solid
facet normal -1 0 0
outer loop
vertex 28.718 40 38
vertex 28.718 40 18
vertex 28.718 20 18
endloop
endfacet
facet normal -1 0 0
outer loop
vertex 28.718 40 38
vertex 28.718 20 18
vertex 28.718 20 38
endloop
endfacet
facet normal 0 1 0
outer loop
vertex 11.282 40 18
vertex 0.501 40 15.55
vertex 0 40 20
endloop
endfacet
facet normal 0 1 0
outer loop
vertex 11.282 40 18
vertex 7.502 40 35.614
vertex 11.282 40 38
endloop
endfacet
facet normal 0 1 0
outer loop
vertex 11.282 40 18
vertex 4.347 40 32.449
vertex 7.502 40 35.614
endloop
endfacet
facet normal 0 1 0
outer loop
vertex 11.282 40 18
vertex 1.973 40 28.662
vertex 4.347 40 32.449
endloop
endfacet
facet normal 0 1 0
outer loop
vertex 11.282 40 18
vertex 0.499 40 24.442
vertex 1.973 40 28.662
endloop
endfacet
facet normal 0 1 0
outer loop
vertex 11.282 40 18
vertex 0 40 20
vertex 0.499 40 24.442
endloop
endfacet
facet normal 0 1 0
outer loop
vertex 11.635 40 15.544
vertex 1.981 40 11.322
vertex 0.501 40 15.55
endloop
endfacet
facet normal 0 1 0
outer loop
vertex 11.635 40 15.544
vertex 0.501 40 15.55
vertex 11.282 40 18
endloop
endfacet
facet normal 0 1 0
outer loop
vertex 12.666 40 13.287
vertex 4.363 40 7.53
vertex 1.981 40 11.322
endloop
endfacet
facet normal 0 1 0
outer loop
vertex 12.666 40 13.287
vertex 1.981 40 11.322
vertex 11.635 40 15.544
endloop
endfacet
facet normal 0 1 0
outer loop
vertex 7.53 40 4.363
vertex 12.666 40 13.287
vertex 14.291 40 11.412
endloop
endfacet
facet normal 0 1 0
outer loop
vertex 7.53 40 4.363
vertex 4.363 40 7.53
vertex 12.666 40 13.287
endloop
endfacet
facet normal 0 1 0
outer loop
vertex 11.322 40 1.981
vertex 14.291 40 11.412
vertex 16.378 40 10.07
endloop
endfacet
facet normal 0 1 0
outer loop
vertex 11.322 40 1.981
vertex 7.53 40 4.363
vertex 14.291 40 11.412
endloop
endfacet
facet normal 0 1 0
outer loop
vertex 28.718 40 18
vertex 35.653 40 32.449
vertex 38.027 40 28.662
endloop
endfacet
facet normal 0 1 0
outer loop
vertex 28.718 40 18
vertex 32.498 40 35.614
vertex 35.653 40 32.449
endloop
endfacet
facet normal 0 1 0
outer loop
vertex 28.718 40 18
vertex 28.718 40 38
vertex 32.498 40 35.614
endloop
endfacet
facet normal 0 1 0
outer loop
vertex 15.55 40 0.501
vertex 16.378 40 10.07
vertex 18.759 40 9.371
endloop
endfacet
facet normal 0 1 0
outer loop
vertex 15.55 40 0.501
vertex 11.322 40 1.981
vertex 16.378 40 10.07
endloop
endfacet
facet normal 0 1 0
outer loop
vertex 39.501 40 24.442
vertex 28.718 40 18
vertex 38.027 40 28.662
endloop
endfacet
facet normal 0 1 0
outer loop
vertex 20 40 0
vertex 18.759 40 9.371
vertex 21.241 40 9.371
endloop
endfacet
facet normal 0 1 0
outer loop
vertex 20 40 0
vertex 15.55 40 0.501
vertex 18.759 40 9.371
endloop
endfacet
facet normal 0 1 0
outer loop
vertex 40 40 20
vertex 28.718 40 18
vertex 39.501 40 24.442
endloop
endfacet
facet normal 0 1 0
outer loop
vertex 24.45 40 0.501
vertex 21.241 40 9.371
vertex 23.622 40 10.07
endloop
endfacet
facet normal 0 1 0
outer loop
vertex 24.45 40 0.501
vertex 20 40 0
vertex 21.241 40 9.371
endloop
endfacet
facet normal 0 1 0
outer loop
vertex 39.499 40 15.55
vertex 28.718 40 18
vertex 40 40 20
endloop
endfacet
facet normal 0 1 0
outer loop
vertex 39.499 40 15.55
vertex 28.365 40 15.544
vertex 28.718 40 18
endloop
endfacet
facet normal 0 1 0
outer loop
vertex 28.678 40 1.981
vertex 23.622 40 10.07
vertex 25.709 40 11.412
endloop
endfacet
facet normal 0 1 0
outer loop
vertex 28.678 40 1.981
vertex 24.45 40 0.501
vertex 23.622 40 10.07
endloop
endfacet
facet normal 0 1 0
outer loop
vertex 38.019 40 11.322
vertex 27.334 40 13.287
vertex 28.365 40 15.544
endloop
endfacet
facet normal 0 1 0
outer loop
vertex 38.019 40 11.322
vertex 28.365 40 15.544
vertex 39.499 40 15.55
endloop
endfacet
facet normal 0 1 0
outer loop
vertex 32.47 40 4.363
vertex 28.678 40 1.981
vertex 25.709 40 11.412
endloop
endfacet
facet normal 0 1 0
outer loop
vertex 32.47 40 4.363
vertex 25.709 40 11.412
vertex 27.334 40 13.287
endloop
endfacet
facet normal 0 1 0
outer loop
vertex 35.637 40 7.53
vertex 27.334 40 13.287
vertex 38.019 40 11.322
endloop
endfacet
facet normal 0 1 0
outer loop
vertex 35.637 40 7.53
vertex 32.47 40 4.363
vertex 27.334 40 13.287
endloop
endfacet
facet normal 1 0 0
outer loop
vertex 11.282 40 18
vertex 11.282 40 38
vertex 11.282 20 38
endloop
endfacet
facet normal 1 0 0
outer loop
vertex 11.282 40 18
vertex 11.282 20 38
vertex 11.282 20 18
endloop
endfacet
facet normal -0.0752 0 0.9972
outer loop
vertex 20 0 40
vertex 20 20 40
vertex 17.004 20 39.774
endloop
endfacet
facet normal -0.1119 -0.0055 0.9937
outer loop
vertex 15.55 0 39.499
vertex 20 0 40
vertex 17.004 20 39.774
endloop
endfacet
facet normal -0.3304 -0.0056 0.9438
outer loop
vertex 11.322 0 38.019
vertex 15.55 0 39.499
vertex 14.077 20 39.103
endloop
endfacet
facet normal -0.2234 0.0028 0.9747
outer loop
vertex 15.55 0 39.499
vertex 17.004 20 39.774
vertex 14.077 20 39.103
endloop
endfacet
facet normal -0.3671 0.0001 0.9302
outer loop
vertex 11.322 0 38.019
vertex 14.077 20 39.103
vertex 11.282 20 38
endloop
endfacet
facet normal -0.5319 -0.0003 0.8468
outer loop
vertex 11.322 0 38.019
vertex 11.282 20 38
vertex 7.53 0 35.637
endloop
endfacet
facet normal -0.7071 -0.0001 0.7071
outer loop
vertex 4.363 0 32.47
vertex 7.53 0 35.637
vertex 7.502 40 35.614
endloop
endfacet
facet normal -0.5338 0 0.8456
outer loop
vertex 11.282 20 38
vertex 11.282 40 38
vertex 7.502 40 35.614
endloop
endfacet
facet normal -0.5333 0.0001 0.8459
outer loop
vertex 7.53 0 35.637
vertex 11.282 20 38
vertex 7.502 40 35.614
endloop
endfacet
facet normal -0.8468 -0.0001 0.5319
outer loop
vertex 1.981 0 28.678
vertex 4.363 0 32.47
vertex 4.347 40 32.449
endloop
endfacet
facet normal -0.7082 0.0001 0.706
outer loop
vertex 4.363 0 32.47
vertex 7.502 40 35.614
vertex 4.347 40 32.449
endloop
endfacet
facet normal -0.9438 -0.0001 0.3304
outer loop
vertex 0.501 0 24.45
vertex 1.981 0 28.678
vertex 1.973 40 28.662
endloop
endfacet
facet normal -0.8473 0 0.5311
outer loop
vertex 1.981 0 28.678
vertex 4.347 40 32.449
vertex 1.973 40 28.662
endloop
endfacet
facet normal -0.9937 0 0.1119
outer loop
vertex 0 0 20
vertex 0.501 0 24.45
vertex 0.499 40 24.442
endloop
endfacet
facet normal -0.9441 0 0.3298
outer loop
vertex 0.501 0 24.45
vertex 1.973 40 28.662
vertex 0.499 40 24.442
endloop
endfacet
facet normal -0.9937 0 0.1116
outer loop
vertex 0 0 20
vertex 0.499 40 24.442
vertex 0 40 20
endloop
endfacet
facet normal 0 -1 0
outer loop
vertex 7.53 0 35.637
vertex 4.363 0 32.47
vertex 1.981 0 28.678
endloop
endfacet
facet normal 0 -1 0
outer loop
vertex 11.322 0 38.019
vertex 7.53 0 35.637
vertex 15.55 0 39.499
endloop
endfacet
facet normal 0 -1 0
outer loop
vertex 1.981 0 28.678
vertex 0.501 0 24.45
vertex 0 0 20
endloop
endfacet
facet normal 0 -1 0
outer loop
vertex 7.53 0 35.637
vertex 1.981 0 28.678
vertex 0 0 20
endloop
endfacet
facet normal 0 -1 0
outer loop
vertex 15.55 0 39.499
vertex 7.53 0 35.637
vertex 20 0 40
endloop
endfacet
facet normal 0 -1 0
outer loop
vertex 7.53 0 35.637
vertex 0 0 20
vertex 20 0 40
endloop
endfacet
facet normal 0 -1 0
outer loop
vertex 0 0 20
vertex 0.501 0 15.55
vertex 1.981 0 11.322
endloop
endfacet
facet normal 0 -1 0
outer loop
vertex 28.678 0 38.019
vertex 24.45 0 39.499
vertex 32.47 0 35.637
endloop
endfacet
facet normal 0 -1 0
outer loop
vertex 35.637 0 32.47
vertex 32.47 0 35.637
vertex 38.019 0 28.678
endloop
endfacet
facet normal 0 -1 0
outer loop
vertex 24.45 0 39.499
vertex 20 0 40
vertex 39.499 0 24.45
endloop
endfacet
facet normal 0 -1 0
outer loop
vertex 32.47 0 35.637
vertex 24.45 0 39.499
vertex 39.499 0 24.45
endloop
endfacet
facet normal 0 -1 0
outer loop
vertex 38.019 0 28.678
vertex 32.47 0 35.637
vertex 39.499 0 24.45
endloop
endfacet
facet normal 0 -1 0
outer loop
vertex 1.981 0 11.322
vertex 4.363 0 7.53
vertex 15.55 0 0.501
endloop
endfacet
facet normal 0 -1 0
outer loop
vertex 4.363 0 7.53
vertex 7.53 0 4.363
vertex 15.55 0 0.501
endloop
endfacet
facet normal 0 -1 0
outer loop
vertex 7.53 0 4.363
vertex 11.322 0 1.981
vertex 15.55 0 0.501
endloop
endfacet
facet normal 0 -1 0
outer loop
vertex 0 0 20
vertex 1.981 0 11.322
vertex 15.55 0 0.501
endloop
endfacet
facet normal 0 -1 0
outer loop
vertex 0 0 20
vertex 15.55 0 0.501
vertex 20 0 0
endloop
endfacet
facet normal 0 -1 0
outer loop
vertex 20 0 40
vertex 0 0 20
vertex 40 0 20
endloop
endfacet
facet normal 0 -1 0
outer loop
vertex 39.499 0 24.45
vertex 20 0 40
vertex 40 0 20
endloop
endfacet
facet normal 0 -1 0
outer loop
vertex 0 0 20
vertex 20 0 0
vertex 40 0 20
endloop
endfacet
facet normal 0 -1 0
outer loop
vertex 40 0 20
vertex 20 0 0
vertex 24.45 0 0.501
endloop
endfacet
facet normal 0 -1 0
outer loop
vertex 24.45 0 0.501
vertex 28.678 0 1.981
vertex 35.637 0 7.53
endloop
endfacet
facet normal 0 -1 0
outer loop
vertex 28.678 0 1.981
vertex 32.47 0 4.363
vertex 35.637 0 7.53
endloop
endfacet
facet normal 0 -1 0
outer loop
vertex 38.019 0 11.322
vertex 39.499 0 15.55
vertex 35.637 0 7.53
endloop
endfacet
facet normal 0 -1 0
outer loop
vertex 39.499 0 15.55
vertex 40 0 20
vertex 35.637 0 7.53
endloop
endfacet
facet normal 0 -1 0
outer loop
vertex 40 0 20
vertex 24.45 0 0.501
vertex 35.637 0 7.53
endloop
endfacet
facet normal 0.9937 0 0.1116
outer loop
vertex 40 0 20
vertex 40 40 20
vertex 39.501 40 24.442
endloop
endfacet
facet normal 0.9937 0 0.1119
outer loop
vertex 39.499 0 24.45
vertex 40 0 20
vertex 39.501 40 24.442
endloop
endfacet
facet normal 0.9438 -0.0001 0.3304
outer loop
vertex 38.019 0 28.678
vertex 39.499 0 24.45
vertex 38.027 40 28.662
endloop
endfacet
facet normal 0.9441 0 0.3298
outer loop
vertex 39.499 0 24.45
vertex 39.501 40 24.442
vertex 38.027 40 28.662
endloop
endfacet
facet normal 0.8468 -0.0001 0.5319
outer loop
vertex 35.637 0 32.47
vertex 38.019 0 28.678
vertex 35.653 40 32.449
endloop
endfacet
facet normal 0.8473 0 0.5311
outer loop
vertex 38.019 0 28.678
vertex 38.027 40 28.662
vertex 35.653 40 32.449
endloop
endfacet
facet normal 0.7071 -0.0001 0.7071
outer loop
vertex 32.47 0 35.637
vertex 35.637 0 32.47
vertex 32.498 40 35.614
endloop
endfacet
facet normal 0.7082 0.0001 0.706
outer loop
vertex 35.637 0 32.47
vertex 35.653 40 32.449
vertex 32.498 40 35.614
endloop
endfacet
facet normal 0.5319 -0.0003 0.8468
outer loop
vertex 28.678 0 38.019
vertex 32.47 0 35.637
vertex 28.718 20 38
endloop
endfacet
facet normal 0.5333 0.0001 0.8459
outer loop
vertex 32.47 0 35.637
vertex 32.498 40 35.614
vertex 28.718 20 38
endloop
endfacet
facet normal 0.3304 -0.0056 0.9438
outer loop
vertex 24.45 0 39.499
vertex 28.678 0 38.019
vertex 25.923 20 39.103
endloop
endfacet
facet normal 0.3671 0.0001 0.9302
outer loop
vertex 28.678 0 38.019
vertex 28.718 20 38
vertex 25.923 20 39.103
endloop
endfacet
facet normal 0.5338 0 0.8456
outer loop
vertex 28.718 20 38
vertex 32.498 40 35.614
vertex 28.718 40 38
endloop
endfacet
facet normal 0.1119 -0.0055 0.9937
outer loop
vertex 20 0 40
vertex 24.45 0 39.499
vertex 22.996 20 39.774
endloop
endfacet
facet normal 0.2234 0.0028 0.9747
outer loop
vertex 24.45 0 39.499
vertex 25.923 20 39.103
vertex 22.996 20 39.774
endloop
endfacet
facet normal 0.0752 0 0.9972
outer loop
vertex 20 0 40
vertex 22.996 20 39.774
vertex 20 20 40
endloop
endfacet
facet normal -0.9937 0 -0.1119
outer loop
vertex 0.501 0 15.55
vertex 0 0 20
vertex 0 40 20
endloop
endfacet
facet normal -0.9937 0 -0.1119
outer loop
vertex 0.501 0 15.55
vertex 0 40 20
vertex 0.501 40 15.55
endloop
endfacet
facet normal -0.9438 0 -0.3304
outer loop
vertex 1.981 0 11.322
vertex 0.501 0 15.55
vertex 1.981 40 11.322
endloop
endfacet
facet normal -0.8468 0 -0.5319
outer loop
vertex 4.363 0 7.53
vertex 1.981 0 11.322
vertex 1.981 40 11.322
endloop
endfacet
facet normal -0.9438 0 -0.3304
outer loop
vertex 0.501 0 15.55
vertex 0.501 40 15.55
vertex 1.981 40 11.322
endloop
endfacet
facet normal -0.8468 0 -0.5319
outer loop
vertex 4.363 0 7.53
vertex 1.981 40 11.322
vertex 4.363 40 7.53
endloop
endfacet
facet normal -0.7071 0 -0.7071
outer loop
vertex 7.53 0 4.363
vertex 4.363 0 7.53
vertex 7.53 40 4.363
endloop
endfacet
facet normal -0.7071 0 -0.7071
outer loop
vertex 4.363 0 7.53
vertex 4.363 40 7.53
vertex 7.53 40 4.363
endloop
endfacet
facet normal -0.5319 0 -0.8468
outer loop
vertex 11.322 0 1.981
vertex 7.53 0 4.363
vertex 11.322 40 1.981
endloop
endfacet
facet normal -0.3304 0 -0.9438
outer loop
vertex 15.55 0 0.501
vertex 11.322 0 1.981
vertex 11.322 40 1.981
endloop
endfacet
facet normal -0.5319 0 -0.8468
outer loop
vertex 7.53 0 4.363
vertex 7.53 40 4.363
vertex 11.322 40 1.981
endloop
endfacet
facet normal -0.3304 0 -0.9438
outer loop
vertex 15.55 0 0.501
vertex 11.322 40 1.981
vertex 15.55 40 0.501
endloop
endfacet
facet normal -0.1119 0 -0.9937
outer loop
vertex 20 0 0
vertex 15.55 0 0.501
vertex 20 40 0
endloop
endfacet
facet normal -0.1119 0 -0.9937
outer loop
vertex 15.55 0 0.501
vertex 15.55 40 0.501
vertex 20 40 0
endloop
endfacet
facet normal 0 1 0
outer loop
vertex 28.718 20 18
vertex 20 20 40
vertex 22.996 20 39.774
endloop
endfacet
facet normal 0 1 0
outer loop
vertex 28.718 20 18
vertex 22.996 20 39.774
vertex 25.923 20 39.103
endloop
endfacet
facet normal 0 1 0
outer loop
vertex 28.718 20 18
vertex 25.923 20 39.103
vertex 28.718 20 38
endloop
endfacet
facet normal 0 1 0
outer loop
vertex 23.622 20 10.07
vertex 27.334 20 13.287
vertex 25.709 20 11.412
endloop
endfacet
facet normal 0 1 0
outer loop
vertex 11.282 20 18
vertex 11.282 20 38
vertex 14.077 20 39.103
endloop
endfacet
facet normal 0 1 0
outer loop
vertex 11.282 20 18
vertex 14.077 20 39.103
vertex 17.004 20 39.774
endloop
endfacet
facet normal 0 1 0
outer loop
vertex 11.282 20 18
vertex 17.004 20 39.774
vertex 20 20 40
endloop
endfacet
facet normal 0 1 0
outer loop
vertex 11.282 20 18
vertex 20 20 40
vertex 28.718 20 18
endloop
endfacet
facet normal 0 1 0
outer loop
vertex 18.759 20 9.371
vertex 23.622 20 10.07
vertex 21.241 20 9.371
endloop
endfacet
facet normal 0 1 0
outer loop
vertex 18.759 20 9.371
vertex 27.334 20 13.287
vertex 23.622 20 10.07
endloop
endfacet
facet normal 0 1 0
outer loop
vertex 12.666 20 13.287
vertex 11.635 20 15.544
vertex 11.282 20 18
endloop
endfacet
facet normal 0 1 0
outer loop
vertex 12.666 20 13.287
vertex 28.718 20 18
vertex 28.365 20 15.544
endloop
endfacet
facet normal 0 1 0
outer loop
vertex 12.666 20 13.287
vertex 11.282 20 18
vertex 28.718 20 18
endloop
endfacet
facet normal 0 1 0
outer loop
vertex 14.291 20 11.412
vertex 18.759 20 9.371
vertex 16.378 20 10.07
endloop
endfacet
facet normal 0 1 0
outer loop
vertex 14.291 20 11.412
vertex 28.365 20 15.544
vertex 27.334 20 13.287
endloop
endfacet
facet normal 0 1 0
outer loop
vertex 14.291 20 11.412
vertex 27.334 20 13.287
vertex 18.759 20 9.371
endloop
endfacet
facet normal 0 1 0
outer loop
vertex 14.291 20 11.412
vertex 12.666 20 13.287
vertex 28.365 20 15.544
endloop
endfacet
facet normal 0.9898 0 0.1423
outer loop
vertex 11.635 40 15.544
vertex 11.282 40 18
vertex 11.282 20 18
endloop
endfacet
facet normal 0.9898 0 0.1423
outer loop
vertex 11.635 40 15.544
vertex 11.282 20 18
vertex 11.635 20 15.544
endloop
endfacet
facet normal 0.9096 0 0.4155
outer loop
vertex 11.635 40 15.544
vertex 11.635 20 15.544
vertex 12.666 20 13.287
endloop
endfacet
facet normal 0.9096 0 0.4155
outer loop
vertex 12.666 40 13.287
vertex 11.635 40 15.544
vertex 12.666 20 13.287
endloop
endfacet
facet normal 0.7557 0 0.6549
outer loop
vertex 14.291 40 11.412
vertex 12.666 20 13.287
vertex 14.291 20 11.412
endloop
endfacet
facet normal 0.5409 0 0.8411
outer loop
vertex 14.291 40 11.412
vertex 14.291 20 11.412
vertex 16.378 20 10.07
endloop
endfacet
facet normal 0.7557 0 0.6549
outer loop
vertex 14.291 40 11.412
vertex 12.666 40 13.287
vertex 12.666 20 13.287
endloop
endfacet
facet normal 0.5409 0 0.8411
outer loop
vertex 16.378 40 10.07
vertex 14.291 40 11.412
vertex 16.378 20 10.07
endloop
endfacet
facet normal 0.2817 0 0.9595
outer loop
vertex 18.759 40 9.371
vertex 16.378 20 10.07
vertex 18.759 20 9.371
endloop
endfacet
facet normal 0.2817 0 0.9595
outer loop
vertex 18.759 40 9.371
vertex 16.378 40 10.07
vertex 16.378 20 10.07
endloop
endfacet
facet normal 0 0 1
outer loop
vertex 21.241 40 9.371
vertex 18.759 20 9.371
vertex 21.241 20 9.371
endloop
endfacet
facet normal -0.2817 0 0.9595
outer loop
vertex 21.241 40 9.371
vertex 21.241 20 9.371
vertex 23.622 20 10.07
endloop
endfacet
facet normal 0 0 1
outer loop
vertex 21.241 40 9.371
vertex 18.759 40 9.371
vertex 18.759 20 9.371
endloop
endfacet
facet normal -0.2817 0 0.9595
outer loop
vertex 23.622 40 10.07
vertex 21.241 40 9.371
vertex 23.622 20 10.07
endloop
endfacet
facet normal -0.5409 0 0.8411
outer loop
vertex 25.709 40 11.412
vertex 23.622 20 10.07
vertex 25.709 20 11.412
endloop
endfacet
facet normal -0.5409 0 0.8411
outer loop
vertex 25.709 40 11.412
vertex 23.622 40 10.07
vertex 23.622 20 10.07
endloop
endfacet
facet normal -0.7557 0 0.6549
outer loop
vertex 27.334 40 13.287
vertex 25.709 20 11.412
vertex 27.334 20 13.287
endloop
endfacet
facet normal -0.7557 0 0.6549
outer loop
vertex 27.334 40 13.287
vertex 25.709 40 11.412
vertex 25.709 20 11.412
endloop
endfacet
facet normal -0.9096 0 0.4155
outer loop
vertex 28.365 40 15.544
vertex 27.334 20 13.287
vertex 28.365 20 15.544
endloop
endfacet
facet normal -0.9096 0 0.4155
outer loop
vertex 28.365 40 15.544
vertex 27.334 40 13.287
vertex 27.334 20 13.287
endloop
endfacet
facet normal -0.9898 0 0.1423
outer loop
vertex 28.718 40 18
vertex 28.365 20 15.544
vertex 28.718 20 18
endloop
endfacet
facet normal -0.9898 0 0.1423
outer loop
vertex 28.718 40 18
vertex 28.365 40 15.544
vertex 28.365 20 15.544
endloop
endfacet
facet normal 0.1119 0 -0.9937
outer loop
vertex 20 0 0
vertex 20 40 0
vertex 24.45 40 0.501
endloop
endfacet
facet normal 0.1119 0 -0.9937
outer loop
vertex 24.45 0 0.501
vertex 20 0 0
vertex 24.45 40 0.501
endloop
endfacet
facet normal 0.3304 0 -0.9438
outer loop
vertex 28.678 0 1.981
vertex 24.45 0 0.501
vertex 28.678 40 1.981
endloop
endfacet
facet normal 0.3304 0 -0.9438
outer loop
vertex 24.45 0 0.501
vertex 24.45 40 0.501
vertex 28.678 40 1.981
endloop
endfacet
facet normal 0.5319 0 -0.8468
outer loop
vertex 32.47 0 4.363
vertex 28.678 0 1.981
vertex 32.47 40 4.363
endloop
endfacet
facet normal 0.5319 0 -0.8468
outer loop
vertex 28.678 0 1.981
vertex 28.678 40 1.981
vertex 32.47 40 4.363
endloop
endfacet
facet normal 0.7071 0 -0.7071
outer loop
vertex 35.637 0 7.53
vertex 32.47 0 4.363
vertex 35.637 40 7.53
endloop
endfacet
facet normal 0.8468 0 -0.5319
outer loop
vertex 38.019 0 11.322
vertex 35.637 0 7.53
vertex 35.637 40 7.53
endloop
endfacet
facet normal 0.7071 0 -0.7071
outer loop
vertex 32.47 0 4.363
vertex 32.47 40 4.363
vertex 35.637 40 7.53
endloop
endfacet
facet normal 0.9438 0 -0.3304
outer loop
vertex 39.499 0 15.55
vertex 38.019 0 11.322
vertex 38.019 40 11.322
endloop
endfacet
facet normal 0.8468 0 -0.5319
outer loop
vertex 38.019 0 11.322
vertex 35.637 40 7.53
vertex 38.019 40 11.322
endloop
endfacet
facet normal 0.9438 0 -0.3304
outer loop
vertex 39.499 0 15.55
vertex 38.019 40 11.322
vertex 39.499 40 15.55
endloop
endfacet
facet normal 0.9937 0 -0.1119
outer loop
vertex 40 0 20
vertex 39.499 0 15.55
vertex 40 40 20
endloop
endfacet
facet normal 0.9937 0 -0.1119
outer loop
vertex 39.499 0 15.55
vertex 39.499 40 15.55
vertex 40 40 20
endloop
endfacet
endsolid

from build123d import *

# Parameters (mm, degrees)
SKETCH1_W           = 40
SKETCH1_H           = 40
BOSS_EXTRUDE1_DEPTH = 40
CUT_EXTRUDE1_DEPTH  = 40
SKETCH3_W           = 2
SKETCH3_H           = 20
CUT_EXTRUDE2_DEPTH  = 40
CUT_EXTRUDE3_DEPTH  = 20


with BuildPart() as part:
    # Sketch1 → Boss-Extrude1 (new body)
    with BuildSketch(Plane.XY):
        with Locations((20, 20)):
            Rectangle(SKETCH1_W, SKETCH1_H)
    extrude(amount=BOSS_EXTRUDE1_DEPTH)

    # Sketch2 → Cut-Extrude1 (cut)
    with BuildSketch(Plane(origin=(0, 40, 0), x_dir=(1, 0, 0), z_dir=(0, 1, 0))):
        with BuildLine():
            Line((20, 0), (0, 0))
            Line((0, 0), (0, -20))
            ThreePointArc((0, -20), (5.857864376, -5.857864376), (20, 0))
        make_face()
        with BuildLine():
            Line((40, 0), (20, 0))
            ThreePointArc((20, 0), (34.142135624, -5.857864376), (40, -20))
            Line((40, -20), (40, 0))
        make_face()
        with BuildLine():
            Line((40, -40), (40, -20))
            ThreePointArc((40, -20), (34.142135624, -34.142135624), (20, -40))
            Line((20, -40), (40, -40))
        make_face()
        with BuildLine():
            ThreePointArc((20, -40), (5.857864376, -34.142135624), (0, -20))
            Line((0, -20), (0, -40))
            Line((0, -40), (20, -40))
        make_face()
    extrude(amount=-CUT_EXTRUDE1_DEPTH, mode=Mode.SUBTRACT)

    # Sketch3 → Cut-Extrude2 (cut)
    with BuildSketch(Plane(origin=(0, 0, 0), x_dir=(0, 0, -1), z_dir=(1, 0, 0))):
        with Locations((-39, 30)):
            Rectangle(SKETCH3_W, SKETCH3_H)
    extrude(amount=CUT_EXTRUDE2_DEPTH, mode=Mode.SUBTRACT)

    # Sketch4 → Cut-Extrude3 (cut)
    with BuildSketch(Plane(origin=(0, 40, 0), x_dir=(1, 0, 0), z_dir=(0, 1, 0))):
        with BuildLine():
            Line((11.282202113, -38), (11.282202113, -18))
            ThreePointArc((11.282202113, -18), (20, -9.282202113), (28.717797887, -18))
            Line((28.717797887, -18), (28.717797887, -38))
            Line((28.717797887, -38), (11.282202113, -38))
        make_face()
    extrude(amount=-CUT_EXTRUDE3_DEPTH, mode=Mode.SUBTRACT)


solid = part.part
